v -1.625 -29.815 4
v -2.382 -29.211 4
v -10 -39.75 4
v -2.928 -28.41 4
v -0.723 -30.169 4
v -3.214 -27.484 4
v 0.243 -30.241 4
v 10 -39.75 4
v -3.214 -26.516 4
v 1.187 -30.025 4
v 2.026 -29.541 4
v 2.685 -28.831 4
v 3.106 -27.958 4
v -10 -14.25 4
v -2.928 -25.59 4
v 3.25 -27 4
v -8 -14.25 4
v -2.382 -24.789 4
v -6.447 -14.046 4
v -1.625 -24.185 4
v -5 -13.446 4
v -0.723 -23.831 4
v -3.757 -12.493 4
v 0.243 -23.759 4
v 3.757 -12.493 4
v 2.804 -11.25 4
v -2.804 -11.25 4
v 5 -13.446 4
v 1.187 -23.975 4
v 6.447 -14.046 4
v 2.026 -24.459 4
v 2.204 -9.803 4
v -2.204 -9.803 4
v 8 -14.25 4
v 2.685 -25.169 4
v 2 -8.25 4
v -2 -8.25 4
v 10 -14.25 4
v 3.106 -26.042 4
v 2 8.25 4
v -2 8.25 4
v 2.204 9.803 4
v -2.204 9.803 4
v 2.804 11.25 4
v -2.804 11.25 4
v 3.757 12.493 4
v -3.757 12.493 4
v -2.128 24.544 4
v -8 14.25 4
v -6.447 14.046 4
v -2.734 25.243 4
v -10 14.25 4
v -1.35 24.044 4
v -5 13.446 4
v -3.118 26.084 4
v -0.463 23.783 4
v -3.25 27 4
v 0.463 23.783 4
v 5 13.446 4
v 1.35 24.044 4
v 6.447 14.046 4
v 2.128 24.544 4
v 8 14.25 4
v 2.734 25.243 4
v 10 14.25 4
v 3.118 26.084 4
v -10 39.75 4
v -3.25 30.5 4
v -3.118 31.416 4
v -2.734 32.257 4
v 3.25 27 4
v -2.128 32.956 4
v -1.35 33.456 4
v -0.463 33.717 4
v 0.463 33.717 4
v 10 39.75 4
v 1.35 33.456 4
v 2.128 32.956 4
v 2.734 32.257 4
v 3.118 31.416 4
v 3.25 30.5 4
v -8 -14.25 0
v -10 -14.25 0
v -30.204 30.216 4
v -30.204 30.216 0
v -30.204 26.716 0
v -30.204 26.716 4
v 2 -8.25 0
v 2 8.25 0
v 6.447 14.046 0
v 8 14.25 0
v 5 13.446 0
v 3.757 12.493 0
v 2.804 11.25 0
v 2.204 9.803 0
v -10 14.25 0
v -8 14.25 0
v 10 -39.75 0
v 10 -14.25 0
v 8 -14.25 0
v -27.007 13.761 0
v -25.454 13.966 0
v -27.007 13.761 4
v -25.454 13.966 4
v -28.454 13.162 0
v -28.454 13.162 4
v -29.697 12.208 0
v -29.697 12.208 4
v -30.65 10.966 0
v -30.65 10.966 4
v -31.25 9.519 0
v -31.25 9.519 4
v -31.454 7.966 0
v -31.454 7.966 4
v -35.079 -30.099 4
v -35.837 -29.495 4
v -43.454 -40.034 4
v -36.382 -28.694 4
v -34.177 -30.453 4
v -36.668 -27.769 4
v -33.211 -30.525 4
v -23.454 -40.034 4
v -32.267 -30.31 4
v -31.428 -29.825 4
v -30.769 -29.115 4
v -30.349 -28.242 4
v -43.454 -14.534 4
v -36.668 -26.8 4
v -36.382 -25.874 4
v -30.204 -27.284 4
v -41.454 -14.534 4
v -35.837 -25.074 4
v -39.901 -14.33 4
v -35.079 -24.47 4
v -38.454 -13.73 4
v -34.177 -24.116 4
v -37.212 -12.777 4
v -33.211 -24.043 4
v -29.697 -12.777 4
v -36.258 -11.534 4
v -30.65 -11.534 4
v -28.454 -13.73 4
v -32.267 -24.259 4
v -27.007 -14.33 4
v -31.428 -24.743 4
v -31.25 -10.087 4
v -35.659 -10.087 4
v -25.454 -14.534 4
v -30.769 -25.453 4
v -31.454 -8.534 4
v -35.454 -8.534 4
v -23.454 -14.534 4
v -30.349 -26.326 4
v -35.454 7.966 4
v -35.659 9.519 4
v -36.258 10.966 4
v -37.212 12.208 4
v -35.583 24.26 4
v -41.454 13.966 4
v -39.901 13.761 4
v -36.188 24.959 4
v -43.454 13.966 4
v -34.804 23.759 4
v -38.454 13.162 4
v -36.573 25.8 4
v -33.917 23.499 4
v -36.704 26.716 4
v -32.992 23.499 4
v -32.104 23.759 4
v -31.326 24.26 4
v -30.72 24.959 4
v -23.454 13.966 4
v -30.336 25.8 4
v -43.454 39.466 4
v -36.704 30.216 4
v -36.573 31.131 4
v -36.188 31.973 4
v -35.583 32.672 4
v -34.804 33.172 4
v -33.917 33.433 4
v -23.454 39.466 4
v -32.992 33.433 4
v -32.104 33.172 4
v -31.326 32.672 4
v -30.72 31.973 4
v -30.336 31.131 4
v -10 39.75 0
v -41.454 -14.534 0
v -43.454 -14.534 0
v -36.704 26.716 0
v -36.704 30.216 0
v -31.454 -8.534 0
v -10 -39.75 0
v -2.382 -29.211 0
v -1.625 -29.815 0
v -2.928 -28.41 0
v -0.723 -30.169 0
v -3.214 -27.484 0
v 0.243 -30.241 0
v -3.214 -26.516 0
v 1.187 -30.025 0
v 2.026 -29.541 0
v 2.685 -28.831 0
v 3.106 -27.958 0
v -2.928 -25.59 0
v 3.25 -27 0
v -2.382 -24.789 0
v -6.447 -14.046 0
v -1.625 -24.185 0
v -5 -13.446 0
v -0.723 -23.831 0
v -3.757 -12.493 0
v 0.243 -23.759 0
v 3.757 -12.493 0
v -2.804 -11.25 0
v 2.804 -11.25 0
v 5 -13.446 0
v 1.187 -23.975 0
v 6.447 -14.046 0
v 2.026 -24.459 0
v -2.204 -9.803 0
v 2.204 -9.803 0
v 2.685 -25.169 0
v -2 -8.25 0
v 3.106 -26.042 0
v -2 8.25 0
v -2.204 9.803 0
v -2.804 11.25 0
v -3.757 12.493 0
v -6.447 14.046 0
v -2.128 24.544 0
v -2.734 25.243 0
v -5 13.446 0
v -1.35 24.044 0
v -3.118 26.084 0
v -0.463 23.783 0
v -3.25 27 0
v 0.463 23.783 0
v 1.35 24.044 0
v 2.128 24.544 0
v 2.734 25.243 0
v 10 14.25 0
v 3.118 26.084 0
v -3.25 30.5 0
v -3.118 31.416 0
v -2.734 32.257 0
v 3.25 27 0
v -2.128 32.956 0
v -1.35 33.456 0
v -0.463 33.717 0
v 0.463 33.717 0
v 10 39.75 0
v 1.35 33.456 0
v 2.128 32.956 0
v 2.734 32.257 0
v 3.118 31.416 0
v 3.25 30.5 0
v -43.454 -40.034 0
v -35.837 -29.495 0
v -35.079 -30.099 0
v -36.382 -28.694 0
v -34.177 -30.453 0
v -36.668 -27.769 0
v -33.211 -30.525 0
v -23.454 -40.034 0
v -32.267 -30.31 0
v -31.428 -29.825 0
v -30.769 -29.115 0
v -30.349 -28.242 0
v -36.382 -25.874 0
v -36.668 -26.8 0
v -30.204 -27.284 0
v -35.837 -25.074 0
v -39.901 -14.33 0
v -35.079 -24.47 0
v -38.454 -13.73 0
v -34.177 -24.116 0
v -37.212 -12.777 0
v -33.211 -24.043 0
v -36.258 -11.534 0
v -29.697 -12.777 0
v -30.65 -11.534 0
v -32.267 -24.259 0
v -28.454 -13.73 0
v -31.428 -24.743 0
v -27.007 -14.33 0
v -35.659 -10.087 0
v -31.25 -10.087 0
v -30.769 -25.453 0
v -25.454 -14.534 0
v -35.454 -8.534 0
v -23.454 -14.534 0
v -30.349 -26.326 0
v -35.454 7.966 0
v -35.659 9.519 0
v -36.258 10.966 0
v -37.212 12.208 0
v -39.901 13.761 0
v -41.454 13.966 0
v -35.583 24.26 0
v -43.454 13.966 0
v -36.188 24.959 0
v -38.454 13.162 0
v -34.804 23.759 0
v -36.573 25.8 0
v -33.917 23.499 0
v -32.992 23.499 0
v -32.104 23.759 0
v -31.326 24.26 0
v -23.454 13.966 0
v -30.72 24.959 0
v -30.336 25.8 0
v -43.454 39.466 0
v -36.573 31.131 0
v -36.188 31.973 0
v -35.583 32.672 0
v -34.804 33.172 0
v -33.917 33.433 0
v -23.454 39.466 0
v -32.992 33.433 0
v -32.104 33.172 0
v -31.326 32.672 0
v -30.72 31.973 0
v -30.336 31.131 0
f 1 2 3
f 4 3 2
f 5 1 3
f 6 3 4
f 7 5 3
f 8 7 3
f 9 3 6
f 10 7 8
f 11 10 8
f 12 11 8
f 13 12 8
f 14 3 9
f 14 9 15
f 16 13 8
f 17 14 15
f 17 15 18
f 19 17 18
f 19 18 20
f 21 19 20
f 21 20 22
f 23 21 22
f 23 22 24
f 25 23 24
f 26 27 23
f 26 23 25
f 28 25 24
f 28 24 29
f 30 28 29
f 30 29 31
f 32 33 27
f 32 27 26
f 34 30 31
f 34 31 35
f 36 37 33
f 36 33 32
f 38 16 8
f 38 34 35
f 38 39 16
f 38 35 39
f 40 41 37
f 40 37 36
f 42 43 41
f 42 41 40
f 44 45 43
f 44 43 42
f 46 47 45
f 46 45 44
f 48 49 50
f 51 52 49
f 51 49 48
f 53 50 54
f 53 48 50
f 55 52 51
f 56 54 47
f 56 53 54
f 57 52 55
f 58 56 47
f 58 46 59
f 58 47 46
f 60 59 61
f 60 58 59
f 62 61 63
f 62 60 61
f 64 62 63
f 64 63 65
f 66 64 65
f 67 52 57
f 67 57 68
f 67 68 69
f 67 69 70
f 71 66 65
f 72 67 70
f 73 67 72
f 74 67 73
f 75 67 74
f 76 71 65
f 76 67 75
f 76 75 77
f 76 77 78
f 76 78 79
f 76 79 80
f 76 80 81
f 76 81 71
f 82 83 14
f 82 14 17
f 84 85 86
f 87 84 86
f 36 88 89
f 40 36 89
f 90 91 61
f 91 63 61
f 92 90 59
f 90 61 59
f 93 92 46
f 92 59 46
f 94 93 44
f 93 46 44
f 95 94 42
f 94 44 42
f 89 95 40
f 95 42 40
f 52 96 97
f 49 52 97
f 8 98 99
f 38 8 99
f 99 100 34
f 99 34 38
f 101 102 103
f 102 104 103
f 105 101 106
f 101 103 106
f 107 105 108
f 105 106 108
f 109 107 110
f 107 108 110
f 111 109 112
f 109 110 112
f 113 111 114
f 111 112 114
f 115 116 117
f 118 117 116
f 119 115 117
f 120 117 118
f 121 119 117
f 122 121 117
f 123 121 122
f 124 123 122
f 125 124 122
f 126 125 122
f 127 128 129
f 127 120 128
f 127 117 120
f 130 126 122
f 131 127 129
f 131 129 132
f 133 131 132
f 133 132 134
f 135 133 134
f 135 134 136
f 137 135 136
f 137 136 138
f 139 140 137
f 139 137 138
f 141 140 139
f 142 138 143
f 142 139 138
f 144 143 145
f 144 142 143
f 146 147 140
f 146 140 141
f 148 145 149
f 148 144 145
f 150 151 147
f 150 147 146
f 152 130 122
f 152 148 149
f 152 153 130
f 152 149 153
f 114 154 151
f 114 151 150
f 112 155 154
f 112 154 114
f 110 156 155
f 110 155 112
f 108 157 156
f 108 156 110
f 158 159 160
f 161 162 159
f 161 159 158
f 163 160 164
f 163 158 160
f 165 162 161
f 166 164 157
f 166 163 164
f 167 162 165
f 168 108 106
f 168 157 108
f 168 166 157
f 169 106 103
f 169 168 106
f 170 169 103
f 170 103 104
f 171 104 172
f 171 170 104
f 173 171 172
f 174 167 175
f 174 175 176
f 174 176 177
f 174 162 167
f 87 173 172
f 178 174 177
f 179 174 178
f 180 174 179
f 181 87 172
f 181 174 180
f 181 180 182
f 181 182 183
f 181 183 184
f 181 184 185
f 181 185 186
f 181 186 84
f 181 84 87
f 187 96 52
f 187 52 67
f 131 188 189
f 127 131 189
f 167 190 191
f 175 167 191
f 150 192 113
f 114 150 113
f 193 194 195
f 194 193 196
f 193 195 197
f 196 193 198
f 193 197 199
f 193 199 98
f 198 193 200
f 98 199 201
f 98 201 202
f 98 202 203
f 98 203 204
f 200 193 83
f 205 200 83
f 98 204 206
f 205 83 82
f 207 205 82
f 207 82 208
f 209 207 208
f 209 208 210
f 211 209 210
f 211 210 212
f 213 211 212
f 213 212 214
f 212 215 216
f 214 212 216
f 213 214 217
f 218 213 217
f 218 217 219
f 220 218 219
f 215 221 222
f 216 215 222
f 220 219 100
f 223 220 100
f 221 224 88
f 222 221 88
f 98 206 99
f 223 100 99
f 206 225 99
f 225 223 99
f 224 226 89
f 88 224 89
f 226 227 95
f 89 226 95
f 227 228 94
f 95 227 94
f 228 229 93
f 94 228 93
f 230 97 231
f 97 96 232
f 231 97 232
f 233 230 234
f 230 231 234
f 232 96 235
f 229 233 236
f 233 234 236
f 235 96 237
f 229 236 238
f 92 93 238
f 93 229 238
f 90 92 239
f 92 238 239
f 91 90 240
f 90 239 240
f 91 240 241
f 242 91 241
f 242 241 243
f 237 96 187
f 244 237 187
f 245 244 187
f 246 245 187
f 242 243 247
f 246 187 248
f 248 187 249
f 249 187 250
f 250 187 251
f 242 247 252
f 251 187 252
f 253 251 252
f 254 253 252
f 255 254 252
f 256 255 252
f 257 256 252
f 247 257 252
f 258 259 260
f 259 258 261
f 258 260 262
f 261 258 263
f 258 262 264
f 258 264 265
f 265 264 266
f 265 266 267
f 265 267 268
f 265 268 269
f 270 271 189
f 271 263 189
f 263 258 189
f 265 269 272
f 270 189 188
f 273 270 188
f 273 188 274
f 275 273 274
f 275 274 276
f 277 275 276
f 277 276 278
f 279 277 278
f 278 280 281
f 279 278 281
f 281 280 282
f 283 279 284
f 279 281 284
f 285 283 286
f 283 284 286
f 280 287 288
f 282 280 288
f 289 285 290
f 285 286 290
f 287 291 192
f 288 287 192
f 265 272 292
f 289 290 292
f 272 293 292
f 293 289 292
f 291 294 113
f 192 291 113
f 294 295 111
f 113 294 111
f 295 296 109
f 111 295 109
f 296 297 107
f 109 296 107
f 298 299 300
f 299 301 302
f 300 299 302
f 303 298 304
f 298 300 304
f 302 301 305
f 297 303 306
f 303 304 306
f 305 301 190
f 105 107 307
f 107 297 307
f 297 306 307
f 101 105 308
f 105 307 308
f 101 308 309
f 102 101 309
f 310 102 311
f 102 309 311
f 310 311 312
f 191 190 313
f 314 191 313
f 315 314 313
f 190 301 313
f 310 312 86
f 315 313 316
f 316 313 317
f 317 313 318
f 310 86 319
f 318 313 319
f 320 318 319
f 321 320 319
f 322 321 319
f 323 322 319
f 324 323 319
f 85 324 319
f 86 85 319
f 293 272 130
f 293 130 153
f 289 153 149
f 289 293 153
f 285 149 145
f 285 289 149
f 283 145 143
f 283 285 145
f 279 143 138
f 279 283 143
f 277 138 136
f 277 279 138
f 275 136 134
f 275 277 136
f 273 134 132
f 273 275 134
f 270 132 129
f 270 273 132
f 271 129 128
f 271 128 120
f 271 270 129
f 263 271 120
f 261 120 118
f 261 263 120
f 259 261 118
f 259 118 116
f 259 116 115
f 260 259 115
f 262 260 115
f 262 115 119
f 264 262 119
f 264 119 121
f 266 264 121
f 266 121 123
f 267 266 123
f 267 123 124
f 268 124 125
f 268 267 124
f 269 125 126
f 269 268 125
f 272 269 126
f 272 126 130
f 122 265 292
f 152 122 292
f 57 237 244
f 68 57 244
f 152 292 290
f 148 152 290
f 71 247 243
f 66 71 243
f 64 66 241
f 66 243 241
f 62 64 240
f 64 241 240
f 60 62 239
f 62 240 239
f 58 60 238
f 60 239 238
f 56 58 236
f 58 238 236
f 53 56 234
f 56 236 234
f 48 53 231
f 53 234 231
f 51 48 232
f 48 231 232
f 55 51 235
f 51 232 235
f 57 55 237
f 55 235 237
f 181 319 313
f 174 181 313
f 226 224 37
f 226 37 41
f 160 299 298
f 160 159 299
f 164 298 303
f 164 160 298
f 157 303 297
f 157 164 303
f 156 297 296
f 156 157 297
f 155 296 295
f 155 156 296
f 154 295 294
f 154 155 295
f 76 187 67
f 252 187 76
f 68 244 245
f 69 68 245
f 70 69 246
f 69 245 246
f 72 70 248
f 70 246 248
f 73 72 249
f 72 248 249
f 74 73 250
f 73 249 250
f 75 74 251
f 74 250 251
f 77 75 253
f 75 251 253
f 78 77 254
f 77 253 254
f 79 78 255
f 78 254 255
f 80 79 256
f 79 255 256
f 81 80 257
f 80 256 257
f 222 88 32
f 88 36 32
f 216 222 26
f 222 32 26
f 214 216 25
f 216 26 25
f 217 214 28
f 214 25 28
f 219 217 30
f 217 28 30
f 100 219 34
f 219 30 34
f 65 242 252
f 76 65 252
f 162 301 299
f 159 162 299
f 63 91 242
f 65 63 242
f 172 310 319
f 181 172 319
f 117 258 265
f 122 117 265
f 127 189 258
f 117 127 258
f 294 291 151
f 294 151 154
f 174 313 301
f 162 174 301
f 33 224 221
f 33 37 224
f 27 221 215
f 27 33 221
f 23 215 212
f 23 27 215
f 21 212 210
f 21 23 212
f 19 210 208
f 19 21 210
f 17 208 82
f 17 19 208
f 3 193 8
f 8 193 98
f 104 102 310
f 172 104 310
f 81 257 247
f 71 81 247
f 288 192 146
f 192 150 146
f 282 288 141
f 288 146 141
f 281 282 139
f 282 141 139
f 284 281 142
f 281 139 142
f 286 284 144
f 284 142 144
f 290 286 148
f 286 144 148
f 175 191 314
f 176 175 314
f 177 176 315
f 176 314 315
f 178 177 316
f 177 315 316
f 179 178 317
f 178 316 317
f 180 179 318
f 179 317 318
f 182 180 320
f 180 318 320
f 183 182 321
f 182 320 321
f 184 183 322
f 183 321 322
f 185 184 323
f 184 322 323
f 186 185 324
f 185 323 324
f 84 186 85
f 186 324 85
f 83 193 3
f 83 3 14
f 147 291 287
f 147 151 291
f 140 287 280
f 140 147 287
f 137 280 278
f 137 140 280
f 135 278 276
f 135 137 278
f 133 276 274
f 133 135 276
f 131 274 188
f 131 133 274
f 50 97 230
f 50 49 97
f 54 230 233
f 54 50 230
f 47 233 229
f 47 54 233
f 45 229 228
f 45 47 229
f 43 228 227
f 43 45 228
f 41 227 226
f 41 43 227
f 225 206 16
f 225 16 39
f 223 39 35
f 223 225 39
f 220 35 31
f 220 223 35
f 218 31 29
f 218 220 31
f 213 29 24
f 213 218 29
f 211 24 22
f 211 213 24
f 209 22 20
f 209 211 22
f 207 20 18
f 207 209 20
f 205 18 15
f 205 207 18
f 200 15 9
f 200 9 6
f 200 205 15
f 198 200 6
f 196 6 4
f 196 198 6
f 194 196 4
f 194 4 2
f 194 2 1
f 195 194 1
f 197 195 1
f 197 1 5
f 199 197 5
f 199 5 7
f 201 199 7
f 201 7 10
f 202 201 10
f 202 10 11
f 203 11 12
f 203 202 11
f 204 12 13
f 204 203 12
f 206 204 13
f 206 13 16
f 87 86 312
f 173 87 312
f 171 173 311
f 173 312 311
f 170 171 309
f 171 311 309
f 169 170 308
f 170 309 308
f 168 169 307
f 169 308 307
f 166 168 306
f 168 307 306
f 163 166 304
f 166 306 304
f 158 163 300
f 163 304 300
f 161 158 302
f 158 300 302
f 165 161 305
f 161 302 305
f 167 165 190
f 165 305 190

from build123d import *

# Parameters (mm, degrees)
F0_W     = 20
F0_H     = 25.5
F0_R     = 3.25
F0_W_2   = 4
F0_H_2   = 28.5
F1_DEPTH = 4
F2_W     = 4
F2_H     = 28.5
F3_DEPTH = 4
F4_R     = 6


with BuildPart() as f1:
    # F0 (on Top) → F1 (new body)
    with BuildSketch(Plane.XY):
        with Locations((0, 27)):
            Rectangle(F0_W, F0_H)
        with BuildLine():
            Line((-3.25, 27), (-3.25, 30.5))
            ThreePointArc((-3.25, 30.5), (0, 33.75), (3.25, 30.5))
            Line((3.25, 30.5), (3.25, 27))
            ThreePointArc((3.25, 27), (0, 23.75), (-3.25, 27))
        make_face(mode=Mode.SUBTRACT)
        with Locations((0, -27)):
            Rectangle(F0_W, F0_H)
        with Locations((0, -27)):
            Circle(F0_R, mode=Mode.SUBTRACT)
        Polygon((-23.45428, 39.465739), (-43.45428, 39.465739), (-43.45428, 13.965739), (-35.45428, 13.965739), (-31.45428, 13.965739), (-23.45428, 13.965739), align=None)
        with BuildLine():
            Line((-36.70428, 26.715739), (-36.70428, 30.215739))
            ThreePointArc((-36.70428, 30.215739), (-33.45428, 33.465739), (-30.20428, 30.215739))
            Line((-30.20428, 30.215739), (-30.20428, 26.715739))
            ThreePointArc((-30.20428, 26.715739), (-33.45428, 23.465739), (-36.70428, 26.715739))
        make_face(mode=Mode.SUBTRACT)
        with Locations((-33.45428, -0.284261)):
            Rectangle(F0_W_2, F0_H_2)
        Polygon((-31.45428, -14.534261), (-35.45428, -14.534261), (-43.45428, -14.534261), (-43.45428, -40.034261), (-23.45428, -40.034261), (-23.45428, -14.534261), align=None)
        with Locations((-33.45428, -27.284261)):
            Circle(F0_R, mode=Mode.SUBTRACT)
    extrude(amount=F1_DEPTH)

    # F2 (on Top) → F3 (join)
    with BuildSketch(Plane.XY):
        Rectangle(F2_W, F2_H)
    extrude(amount=F3_DEPTH)

    # F4
    f4_edges = [f1.edges().sort_by_distance(p)[0] for p in [
        (-2, 14.25, 2),
        (2, 14.25, 2),
        (2, -14.25, 2),
        (-2, -14.25, 2),
        (-35.45428, 13.965739, 2),
        (-31.45428, 13.965739, 2),
        (-31.45428, -14.534261, 2),
        (-35.45428, -14.534261, 2),
    ]]
    fillet(f4_edges, radius=F4_R)


solid = f1.part
